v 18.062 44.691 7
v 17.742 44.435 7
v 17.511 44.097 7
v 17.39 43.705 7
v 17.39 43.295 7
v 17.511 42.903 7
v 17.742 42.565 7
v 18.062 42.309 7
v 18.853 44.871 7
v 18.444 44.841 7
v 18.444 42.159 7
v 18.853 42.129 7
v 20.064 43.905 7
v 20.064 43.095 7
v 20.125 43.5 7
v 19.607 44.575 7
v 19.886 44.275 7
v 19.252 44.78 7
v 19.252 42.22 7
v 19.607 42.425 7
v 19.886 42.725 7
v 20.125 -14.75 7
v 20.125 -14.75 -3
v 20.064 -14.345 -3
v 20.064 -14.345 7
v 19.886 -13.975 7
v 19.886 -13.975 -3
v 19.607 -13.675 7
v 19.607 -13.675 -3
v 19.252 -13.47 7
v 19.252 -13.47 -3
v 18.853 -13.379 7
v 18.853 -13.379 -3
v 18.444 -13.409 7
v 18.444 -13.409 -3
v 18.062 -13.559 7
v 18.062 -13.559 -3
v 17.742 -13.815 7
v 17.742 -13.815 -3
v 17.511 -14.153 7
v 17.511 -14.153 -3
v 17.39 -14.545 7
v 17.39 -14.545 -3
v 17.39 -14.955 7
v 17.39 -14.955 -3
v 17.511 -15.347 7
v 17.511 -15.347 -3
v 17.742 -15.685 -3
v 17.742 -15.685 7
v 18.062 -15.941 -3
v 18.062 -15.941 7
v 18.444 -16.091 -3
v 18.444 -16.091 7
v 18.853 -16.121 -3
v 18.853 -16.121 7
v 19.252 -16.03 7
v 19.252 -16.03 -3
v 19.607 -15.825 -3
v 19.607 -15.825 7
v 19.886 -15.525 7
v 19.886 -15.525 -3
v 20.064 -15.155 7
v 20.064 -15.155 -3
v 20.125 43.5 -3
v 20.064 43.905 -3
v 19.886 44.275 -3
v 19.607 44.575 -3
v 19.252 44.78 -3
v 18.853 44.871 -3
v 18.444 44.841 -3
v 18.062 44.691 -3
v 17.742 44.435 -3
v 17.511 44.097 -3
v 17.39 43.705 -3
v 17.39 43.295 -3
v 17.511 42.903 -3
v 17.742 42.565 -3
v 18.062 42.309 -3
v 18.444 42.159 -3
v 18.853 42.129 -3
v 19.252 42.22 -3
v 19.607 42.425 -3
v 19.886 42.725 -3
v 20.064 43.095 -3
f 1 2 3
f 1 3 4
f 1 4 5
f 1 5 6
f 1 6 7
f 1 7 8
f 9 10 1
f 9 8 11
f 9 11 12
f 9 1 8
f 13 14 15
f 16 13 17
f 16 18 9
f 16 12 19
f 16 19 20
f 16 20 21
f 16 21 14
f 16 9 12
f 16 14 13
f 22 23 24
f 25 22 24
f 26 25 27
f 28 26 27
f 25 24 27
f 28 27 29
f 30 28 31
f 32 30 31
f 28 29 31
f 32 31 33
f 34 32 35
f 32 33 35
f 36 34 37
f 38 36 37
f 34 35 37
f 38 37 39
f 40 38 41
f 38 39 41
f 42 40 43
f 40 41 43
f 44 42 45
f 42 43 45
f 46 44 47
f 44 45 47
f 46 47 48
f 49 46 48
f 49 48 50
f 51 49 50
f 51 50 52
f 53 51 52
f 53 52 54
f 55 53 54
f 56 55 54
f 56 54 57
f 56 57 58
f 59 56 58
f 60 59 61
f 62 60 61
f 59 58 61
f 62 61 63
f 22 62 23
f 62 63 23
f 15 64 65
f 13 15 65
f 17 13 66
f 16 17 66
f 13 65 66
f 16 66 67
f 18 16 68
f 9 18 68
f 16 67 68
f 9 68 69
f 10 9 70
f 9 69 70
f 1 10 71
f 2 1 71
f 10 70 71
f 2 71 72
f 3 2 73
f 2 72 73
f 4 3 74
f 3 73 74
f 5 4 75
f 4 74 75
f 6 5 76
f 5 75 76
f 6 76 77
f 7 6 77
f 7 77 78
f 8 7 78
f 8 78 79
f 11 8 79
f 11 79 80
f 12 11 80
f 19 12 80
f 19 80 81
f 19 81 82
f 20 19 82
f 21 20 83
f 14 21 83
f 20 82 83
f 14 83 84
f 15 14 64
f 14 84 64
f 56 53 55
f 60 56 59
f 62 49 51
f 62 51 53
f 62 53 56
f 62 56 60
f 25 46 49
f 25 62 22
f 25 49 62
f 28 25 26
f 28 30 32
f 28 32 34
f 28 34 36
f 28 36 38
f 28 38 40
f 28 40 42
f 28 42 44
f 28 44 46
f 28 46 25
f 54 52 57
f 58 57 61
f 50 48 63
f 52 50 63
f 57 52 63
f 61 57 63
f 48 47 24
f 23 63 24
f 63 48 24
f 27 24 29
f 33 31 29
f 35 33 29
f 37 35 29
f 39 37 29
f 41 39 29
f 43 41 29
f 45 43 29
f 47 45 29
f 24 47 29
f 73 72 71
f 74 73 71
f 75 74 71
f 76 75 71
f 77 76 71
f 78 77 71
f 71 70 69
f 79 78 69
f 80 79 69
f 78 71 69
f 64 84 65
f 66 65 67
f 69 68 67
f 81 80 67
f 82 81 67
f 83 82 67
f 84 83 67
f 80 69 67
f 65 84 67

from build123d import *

# Parameters (mm, degrees)
CYLINDER009_R     = 1.375
CYLINDER009_DEPTH = 10
CYLINDER006_R     = 1.375
CYLINDER006_DEPTH = 10


with BuildPart() as cylinder009:
    # Cylinder009 → Cylinder009 (new body)
    with BuildSketch(Plane(origin=(18.75, -14.75, -3), x_dir=(1, 0, 0), z_dir=(0, 0, 1))):
        Circle(CYLINDER009_R)
    extrude(amount=CYLINDER009_DEPTH)


with BuildPart() as hole_cuts2:
    # Cylinder006 → Cylinder006 (new body)
    with BuildSketch(Plane(origin=(18.75, 43.5, -3), x_dir=(1, 0, 0), z_dir=(0, 0, 1))):
        Circle(CYLINDER006_R)
    extrude(amount=CYLINDER006_DEPTH)

    # Fusion002003003003: union Cylinder009
    add(cylinder009.part)


solid = hole_cuts2.part
